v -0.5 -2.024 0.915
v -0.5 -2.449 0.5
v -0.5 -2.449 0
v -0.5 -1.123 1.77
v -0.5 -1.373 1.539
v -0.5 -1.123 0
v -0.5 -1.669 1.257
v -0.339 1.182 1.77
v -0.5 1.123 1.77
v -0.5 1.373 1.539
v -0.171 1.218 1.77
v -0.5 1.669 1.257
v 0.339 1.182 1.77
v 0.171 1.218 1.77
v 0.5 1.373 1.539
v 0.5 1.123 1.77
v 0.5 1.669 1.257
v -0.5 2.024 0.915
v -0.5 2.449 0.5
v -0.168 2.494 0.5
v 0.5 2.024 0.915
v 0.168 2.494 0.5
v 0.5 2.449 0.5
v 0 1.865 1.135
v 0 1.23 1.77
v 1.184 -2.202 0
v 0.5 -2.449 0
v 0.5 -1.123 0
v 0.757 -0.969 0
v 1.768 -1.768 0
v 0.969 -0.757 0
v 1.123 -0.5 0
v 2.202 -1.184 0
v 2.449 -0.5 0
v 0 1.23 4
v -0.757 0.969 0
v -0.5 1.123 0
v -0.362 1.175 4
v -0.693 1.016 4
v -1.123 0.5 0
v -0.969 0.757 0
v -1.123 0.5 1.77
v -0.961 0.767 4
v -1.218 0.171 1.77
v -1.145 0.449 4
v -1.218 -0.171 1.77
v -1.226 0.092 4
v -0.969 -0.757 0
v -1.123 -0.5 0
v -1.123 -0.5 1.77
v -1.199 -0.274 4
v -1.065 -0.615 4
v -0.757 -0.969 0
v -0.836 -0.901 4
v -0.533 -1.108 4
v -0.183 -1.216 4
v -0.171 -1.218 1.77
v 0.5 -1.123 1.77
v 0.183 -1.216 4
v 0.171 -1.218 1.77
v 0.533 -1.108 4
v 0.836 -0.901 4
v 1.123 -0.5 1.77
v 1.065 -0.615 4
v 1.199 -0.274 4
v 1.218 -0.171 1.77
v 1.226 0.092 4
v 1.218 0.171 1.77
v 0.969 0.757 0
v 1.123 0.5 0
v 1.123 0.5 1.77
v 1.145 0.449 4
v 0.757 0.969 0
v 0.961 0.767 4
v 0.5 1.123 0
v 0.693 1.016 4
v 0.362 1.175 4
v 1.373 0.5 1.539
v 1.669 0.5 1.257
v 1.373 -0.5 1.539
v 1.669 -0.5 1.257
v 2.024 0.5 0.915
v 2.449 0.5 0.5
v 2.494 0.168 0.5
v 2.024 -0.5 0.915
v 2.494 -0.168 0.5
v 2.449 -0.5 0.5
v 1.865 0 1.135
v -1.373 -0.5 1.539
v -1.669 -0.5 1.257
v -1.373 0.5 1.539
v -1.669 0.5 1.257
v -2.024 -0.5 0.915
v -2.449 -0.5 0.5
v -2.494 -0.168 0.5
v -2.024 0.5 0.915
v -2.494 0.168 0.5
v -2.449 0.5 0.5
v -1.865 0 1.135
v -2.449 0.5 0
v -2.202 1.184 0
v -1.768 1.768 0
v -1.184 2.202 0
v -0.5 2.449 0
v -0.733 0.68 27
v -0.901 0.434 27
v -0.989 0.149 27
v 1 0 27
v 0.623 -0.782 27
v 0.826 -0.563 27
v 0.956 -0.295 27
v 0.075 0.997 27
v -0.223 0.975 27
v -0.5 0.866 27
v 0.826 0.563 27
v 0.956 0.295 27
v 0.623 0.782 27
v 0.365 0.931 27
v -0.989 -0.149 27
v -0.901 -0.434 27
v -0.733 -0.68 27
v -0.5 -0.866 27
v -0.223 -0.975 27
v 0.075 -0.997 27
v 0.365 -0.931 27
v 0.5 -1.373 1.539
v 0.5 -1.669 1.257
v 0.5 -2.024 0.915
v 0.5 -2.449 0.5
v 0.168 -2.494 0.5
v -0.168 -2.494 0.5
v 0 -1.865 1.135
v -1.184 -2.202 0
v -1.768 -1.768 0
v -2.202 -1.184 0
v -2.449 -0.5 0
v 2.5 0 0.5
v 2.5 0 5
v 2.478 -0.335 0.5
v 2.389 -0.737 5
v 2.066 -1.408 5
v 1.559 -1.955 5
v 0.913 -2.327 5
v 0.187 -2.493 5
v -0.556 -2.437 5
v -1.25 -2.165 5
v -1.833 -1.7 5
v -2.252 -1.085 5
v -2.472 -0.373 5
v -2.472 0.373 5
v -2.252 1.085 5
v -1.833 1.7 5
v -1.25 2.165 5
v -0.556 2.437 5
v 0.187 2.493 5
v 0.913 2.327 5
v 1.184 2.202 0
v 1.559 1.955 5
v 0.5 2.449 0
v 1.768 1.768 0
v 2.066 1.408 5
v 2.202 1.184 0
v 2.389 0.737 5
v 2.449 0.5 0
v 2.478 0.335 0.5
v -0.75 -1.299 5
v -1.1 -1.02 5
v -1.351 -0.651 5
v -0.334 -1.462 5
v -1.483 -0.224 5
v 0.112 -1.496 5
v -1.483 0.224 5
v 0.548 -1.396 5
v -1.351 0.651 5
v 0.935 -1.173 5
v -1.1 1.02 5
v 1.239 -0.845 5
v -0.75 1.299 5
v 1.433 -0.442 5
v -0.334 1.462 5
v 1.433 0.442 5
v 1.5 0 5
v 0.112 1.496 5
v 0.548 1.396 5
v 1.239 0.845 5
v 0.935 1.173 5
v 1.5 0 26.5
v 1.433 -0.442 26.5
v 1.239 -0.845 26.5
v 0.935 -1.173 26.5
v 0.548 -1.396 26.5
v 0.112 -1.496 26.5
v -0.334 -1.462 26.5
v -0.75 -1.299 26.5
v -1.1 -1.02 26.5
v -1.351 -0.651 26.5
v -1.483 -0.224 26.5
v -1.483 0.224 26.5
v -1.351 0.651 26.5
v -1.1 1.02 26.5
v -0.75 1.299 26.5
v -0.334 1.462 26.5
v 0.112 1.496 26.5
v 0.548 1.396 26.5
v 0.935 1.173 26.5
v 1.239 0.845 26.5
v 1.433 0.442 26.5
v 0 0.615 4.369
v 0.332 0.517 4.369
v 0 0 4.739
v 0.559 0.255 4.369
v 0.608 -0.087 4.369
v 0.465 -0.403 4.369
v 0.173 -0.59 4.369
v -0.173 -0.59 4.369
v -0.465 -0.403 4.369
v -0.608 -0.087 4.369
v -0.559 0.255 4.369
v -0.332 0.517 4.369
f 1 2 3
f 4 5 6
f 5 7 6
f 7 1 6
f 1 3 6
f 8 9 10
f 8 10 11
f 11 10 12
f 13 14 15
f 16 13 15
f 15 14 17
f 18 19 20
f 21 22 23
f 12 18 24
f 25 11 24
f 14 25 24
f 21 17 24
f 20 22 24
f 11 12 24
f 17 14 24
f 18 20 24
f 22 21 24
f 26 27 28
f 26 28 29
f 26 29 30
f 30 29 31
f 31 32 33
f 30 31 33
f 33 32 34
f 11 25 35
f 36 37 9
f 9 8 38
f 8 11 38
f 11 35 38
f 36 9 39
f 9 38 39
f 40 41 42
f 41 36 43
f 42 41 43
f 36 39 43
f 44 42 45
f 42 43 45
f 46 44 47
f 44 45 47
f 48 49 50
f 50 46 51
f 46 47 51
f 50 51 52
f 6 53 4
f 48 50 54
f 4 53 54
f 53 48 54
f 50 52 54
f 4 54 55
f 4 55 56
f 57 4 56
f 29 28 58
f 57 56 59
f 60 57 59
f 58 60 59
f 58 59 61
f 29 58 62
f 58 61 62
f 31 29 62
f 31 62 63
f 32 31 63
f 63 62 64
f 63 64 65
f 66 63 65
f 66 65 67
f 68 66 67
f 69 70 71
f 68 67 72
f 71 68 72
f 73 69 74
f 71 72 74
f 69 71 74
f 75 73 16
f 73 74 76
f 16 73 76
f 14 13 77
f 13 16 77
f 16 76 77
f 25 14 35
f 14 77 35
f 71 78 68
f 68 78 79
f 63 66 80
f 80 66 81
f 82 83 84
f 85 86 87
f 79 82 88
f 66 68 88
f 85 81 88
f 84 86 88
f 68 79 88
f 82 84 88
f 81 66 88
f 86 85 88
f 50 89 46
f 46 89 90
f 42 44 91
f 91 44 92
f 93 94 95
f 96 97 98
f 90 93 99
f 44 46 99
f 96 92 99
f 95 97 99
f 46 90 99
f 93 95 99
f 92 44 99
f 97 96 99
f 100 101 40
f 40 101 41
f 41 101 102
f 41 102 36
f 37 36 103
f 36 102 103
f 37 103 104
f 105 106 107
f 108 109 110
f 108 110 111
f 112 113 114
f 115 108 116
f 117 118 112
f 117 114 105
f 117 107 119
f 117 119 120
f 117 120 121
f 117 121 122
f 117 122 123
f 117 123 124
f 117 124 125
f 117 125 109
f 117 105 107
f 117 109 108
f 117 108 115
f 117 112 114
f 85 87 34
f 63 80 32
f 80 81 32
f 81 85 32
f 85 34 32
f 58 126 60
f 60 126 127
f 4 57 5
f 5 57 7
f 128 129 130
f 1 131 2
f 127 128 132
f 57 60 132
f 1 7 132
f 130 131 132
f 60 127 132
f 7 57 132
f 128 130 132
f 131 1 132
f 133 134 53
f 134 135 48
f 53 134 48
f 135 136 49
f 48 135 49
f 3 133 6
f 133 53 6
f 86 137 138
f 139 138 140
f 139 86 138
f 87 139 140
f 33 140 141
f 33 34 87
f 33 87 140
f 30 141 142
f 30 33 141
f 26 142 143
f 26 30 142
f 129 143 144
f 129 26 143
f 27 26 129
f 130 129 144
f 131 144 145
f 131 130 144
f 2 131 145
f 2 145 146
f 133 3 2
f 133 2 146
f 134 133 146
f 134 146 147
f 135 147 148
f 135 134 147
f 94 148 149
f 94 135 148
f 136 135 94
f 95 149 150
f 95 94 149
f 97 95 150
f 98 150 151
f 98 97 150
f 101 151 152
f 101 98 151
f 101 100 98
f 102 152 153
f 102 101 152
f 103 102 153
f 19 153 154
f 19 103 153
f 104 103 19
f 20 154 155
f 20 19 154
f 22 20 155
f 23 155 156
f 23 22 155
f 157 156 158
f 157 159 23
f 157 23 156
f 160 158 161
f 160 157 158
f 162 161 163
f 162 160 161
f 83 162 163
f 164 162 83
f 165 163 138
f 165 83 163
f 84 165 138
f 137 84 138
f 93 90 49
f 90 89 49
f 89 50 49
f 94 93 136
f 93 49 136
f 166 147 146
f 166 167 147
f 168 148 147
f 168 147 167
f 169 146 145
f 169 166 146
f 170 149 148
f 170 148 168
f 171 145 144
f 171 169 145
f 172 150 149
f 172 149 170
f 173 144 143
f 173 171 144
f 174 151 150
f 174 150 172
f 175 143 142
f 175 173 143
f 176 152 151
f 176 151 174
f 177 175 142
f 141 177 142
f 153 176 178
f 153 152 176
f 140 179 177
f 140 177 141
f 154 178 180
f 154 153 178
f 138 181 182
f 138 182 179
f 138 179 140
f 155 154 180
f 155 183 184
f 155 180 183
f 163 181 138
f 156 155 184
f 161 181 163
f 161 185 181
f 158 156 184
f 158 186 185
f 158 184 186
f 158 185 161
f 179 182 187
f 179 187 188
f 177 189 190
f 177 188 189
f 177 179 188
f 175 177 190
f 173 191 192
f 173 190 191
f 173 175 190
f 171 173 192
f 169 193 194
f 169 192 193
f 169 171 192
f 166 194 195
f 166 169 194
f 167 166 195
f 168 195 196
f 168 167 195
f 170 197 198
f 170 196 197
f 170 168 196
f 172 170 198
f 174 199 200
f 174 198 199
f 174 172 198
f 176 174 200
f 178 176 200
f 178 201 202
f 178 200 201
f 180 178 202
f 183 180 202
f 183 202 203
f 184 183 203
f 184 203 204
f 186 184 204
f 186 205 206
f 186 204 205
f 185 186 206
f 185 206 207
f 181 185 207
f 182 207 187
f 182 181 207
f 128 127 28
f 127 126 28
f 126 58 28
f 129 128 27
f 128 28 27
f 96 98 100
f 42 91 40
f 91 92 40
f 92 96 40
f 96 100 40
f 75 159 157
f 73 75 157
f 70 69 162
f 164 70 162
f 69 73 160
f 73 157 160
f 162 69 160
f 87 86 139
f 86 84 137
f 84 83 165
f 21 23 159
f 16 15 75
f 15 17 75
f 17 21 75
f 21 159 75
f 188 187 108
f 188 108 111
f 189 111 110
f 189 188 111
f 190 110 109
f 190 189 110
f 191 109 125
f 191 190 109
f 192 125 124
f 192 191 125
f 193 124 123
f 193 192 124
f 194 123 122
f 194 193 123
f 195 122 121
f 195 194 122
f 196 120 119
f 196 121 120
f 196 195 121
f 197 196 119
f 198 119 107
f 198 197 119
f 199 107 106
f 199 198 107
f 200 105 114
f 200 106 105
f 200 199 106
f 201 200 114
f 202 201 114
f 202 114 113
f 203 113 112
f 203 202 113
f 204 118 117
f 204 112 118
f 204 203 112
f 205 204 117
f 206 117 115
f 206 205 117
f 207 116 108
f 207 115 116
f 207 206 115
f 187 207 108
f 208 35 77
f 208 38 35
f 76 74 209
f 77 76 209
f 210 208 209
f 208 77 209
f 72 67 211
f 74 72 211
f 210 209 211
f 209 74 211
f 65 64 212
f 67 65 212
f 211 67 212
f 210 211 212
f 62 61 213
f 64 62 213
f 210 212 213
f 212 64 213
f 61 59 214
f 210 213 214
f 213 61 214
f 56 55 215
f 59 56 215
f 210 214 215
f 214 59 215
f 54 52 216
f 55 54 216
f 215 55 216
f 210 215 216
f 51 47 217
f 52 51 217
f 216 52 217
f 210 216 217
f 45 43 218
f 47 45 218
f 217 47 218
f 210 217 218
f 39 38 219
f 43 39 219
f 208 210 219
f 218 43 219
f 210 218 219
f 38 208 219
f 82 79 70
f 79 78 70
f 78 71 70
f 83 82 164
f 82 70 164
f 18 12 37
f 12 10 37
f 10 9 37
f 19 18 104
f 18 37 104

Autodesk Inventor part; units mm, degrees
ref_plane "YZ Plane" through (0, 0, 0) normal (1, 0, 0) x (0, 1, 0)
ref_plane "XZ Plane" through (0, 0, 0) normal (0, 1, 0) x (-1, 0, 0)
ref_plane "XY Plane" through (0, 0, 0) normal (0, 0, 1) x (1, 0, 0)
sketch "Esboço1" plane through (0, 0, 0) normal (0, 0, 1) x (1, 0, 0)
  circle A0 centre (0, 0) radius 2.5
  dimension "d0" = 5
extrude "Extrusão1" add sketch "Esboço1" along normal blind 5
sketch "Esboço2" plane through (0, 0, 5) normal (0, 0, 1) x (1, 0, 0)
  circle A0 centre (0, 0) radius 1.5
  dimension "d3" = 3
extrude "Extrusão2" add sketch "Esboço2" along normal blind 22
thread "Rosca1" size "M3x0.5" class "6g" standard "ANSI Metric M Profile" length 15 offset 7
sketch "Esboço3" plane through (0, 0, 0) normal (0, 0, -1) x (-1, 0, 0)
  point P0 (0, 0)
  point P1 (0, 0)
  dimension "d15" = 0
  dimension "d16" = 0
hole "Furo1" at (0, 0, 0) direction (0, 0, 1) diameter 2.459 depth 4 tip angle 118 thread size "M3x0.5" class "6H" standard "ANSI Metric M Profile"
sketch "Esboço4" plane through (0, 0, 0) normal (0, 0, -1) x (-1, 0, 0)
  line L0 (-0.5, -3) -> (0.5, -3)
  line L1 (0.5, -3) -> (0.5, 3)
  line L2 (0.5, 3) -> (-0.5, 3)
  line L3 (-0.5, 3) -> (-0.5, -3)
  line L4 (-0.5, -3) -> (0.5, 3) construction
  line L5 (0.5, -3) -> (-0.5, 3) construction
  line L6 (-3, -0.5) -> (3, -0.5)
  line L7 (3, -0.5) -> (3, 0.5)
  line L8 (3, 0.5) -> (-3, 0.5)
  line L9 (-3, 0.5) -> (-3, -0.5)
  line L10 (-3, -0.5) -> (3, 0.5) construction
  line L11 (3, -0.5) -> (-3, 0.5) construction
  point P0 (0, 0)
  point P1 (-0.5, -0.5)
  point P2 (-0.5, 0.5)
  point P3 (0.5, 0.5)
  point P4 (0.5, -0.5)
  dimension "d17" = 1
  dimension "d18" = 6
  dimension "d19" = 6
  dimension "d20" = 1
extrude "Extrusão3" cut sketch "Esboço4" against normal blind 0.5 contours L3 L6 L1 L0 | L6 L9 L8 L3 | L1 L8 L7 L6 | L3 L2 L1 L8
chamfer "Chanfro1" distance 1.27 angle 45 3 edges at (0, -1.2295, 0.5) (1.2295, 0, 0.5) (-1.2295, 0, 0.5)
chamfer "Chanfro2" distance 0.5 angle 45 1 edges at (-1.5, 0, 27)
properties part number "PARAFUSO"
